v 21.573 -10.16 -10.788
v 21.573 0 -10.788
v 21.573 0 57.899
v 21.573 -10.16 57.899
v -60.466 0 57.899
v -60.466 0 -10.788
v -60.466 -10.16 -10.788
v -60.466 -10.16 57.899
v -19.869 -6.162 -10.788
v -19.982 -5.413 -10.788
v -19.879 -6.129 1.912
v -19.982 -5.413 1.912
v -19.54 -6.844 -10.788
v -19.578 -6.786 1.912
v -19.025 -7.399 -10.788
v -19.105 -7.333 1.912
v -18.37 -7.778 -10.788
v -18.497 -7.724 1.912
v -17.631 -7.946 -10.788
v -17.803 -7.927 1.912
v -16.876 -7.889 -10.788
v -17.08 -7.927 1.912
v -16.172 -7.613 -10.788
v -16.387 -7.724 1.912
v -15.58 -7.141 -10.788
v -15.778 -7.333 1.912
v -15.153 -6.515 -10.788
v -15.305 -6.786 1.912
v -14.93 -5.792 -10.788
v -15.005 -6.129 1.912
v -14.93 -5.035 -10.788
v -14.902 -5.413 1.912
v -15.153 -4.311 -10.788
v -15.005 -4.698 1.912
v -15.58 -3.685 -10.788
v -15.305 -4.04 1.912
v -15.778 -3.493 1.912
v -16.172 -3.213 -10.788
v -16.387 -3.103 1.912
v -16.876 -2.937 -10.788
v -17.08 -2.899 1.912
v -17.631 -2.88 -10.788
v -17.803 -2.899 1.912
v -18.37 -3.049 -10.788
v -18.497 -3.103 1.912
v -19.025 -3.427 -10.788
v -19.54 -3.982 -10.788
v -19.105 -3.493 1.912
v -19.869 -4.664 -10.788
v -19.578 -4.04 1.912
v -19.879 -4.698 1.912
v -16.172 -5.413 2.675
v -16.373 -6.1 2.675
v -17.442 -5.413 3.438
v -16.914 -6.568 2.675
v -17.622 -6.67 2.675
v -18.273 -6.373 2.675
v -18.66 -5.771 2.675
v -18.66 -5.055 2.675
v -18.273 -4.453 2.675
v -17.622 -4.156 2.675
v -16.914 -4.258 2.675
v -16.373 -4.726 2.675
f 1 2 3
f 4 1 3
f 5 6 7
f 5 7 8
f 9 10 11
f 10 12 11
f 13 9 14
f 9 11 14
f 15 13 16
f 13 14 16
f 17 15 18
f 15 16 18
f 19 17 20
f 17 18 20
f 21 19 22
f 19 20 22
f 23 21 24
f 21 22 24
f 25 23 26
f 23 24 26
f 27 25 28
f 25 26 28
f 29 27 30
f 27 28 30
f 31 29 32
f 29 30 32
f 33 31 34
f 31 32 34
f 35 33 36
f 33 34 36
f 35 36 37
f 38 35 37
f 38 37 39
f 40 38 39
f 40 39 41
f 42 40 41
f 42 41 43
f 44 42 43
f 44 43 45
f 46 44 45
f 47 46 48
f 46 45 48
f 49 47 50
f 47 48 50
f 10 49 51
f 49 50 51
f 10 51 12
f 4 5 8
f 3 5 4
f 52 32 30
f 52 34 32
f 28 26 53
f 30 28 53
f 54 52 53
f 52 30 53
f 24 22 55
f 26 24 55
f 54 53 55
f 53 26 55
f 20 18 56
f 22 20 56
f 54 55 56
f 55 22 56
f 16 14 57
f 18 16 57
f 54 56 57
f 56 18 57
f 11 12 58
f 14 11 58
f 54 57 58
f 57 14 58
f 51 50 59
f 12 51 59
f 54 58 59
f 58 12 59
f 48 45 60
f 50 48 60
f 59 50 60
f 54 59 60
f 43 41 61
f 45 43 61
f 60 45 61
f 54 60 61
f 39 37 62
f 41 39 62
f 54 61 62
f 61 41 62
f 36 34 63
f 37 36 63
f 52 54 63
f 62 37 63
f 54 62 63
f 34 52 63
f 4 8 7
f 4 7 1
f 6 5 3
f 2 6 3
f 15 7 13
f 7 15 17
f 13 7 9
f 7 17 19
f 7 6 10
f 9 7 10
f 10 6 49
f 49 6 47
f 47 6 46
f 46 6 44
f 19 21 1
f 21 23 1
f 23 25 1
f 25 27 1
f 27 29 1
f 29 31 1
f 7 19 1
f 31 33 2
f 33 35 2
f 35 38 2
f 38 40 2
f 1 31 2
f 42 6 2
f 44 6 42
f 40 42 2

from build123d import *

# Parameters (mm, degrees)
F0_W     = 82.0386651903
F0_H     = 68.6869425699
F1_DEPTH = 10.16
F3_D     = 5.08
F3_DEPTH = 12.7
F3_TIP   = 1.5261859723


with BuildPart() as f1:
    # F0 (on Front) → F1 (new body)
    with BuildSketch(Plane.XZ):
        with Locations((-19.4462044165, 23.5556685366)):
            Rectangle(F0_W, F0_H)
    extrude(amount=F1_DEPTH)

    # F3
    with Locations(Plane(origin=(0, 0, -10.7878027484), x_dir=(1, 0, 0), z_dir=(0, 0, -1))):
        with Locations((-17.4416806549, 5.4131019861)):
            Hole(F3_D / 2, depth=F3_DEPTH)
            with Locations((0, 0, -(F3_DEPTH + F3_TIP / 2))):  # 118° drill point
                Cone(0, F3_D / 2, F3_TIP, mode=Mode.SUBTRACT)


solid = f1.part
